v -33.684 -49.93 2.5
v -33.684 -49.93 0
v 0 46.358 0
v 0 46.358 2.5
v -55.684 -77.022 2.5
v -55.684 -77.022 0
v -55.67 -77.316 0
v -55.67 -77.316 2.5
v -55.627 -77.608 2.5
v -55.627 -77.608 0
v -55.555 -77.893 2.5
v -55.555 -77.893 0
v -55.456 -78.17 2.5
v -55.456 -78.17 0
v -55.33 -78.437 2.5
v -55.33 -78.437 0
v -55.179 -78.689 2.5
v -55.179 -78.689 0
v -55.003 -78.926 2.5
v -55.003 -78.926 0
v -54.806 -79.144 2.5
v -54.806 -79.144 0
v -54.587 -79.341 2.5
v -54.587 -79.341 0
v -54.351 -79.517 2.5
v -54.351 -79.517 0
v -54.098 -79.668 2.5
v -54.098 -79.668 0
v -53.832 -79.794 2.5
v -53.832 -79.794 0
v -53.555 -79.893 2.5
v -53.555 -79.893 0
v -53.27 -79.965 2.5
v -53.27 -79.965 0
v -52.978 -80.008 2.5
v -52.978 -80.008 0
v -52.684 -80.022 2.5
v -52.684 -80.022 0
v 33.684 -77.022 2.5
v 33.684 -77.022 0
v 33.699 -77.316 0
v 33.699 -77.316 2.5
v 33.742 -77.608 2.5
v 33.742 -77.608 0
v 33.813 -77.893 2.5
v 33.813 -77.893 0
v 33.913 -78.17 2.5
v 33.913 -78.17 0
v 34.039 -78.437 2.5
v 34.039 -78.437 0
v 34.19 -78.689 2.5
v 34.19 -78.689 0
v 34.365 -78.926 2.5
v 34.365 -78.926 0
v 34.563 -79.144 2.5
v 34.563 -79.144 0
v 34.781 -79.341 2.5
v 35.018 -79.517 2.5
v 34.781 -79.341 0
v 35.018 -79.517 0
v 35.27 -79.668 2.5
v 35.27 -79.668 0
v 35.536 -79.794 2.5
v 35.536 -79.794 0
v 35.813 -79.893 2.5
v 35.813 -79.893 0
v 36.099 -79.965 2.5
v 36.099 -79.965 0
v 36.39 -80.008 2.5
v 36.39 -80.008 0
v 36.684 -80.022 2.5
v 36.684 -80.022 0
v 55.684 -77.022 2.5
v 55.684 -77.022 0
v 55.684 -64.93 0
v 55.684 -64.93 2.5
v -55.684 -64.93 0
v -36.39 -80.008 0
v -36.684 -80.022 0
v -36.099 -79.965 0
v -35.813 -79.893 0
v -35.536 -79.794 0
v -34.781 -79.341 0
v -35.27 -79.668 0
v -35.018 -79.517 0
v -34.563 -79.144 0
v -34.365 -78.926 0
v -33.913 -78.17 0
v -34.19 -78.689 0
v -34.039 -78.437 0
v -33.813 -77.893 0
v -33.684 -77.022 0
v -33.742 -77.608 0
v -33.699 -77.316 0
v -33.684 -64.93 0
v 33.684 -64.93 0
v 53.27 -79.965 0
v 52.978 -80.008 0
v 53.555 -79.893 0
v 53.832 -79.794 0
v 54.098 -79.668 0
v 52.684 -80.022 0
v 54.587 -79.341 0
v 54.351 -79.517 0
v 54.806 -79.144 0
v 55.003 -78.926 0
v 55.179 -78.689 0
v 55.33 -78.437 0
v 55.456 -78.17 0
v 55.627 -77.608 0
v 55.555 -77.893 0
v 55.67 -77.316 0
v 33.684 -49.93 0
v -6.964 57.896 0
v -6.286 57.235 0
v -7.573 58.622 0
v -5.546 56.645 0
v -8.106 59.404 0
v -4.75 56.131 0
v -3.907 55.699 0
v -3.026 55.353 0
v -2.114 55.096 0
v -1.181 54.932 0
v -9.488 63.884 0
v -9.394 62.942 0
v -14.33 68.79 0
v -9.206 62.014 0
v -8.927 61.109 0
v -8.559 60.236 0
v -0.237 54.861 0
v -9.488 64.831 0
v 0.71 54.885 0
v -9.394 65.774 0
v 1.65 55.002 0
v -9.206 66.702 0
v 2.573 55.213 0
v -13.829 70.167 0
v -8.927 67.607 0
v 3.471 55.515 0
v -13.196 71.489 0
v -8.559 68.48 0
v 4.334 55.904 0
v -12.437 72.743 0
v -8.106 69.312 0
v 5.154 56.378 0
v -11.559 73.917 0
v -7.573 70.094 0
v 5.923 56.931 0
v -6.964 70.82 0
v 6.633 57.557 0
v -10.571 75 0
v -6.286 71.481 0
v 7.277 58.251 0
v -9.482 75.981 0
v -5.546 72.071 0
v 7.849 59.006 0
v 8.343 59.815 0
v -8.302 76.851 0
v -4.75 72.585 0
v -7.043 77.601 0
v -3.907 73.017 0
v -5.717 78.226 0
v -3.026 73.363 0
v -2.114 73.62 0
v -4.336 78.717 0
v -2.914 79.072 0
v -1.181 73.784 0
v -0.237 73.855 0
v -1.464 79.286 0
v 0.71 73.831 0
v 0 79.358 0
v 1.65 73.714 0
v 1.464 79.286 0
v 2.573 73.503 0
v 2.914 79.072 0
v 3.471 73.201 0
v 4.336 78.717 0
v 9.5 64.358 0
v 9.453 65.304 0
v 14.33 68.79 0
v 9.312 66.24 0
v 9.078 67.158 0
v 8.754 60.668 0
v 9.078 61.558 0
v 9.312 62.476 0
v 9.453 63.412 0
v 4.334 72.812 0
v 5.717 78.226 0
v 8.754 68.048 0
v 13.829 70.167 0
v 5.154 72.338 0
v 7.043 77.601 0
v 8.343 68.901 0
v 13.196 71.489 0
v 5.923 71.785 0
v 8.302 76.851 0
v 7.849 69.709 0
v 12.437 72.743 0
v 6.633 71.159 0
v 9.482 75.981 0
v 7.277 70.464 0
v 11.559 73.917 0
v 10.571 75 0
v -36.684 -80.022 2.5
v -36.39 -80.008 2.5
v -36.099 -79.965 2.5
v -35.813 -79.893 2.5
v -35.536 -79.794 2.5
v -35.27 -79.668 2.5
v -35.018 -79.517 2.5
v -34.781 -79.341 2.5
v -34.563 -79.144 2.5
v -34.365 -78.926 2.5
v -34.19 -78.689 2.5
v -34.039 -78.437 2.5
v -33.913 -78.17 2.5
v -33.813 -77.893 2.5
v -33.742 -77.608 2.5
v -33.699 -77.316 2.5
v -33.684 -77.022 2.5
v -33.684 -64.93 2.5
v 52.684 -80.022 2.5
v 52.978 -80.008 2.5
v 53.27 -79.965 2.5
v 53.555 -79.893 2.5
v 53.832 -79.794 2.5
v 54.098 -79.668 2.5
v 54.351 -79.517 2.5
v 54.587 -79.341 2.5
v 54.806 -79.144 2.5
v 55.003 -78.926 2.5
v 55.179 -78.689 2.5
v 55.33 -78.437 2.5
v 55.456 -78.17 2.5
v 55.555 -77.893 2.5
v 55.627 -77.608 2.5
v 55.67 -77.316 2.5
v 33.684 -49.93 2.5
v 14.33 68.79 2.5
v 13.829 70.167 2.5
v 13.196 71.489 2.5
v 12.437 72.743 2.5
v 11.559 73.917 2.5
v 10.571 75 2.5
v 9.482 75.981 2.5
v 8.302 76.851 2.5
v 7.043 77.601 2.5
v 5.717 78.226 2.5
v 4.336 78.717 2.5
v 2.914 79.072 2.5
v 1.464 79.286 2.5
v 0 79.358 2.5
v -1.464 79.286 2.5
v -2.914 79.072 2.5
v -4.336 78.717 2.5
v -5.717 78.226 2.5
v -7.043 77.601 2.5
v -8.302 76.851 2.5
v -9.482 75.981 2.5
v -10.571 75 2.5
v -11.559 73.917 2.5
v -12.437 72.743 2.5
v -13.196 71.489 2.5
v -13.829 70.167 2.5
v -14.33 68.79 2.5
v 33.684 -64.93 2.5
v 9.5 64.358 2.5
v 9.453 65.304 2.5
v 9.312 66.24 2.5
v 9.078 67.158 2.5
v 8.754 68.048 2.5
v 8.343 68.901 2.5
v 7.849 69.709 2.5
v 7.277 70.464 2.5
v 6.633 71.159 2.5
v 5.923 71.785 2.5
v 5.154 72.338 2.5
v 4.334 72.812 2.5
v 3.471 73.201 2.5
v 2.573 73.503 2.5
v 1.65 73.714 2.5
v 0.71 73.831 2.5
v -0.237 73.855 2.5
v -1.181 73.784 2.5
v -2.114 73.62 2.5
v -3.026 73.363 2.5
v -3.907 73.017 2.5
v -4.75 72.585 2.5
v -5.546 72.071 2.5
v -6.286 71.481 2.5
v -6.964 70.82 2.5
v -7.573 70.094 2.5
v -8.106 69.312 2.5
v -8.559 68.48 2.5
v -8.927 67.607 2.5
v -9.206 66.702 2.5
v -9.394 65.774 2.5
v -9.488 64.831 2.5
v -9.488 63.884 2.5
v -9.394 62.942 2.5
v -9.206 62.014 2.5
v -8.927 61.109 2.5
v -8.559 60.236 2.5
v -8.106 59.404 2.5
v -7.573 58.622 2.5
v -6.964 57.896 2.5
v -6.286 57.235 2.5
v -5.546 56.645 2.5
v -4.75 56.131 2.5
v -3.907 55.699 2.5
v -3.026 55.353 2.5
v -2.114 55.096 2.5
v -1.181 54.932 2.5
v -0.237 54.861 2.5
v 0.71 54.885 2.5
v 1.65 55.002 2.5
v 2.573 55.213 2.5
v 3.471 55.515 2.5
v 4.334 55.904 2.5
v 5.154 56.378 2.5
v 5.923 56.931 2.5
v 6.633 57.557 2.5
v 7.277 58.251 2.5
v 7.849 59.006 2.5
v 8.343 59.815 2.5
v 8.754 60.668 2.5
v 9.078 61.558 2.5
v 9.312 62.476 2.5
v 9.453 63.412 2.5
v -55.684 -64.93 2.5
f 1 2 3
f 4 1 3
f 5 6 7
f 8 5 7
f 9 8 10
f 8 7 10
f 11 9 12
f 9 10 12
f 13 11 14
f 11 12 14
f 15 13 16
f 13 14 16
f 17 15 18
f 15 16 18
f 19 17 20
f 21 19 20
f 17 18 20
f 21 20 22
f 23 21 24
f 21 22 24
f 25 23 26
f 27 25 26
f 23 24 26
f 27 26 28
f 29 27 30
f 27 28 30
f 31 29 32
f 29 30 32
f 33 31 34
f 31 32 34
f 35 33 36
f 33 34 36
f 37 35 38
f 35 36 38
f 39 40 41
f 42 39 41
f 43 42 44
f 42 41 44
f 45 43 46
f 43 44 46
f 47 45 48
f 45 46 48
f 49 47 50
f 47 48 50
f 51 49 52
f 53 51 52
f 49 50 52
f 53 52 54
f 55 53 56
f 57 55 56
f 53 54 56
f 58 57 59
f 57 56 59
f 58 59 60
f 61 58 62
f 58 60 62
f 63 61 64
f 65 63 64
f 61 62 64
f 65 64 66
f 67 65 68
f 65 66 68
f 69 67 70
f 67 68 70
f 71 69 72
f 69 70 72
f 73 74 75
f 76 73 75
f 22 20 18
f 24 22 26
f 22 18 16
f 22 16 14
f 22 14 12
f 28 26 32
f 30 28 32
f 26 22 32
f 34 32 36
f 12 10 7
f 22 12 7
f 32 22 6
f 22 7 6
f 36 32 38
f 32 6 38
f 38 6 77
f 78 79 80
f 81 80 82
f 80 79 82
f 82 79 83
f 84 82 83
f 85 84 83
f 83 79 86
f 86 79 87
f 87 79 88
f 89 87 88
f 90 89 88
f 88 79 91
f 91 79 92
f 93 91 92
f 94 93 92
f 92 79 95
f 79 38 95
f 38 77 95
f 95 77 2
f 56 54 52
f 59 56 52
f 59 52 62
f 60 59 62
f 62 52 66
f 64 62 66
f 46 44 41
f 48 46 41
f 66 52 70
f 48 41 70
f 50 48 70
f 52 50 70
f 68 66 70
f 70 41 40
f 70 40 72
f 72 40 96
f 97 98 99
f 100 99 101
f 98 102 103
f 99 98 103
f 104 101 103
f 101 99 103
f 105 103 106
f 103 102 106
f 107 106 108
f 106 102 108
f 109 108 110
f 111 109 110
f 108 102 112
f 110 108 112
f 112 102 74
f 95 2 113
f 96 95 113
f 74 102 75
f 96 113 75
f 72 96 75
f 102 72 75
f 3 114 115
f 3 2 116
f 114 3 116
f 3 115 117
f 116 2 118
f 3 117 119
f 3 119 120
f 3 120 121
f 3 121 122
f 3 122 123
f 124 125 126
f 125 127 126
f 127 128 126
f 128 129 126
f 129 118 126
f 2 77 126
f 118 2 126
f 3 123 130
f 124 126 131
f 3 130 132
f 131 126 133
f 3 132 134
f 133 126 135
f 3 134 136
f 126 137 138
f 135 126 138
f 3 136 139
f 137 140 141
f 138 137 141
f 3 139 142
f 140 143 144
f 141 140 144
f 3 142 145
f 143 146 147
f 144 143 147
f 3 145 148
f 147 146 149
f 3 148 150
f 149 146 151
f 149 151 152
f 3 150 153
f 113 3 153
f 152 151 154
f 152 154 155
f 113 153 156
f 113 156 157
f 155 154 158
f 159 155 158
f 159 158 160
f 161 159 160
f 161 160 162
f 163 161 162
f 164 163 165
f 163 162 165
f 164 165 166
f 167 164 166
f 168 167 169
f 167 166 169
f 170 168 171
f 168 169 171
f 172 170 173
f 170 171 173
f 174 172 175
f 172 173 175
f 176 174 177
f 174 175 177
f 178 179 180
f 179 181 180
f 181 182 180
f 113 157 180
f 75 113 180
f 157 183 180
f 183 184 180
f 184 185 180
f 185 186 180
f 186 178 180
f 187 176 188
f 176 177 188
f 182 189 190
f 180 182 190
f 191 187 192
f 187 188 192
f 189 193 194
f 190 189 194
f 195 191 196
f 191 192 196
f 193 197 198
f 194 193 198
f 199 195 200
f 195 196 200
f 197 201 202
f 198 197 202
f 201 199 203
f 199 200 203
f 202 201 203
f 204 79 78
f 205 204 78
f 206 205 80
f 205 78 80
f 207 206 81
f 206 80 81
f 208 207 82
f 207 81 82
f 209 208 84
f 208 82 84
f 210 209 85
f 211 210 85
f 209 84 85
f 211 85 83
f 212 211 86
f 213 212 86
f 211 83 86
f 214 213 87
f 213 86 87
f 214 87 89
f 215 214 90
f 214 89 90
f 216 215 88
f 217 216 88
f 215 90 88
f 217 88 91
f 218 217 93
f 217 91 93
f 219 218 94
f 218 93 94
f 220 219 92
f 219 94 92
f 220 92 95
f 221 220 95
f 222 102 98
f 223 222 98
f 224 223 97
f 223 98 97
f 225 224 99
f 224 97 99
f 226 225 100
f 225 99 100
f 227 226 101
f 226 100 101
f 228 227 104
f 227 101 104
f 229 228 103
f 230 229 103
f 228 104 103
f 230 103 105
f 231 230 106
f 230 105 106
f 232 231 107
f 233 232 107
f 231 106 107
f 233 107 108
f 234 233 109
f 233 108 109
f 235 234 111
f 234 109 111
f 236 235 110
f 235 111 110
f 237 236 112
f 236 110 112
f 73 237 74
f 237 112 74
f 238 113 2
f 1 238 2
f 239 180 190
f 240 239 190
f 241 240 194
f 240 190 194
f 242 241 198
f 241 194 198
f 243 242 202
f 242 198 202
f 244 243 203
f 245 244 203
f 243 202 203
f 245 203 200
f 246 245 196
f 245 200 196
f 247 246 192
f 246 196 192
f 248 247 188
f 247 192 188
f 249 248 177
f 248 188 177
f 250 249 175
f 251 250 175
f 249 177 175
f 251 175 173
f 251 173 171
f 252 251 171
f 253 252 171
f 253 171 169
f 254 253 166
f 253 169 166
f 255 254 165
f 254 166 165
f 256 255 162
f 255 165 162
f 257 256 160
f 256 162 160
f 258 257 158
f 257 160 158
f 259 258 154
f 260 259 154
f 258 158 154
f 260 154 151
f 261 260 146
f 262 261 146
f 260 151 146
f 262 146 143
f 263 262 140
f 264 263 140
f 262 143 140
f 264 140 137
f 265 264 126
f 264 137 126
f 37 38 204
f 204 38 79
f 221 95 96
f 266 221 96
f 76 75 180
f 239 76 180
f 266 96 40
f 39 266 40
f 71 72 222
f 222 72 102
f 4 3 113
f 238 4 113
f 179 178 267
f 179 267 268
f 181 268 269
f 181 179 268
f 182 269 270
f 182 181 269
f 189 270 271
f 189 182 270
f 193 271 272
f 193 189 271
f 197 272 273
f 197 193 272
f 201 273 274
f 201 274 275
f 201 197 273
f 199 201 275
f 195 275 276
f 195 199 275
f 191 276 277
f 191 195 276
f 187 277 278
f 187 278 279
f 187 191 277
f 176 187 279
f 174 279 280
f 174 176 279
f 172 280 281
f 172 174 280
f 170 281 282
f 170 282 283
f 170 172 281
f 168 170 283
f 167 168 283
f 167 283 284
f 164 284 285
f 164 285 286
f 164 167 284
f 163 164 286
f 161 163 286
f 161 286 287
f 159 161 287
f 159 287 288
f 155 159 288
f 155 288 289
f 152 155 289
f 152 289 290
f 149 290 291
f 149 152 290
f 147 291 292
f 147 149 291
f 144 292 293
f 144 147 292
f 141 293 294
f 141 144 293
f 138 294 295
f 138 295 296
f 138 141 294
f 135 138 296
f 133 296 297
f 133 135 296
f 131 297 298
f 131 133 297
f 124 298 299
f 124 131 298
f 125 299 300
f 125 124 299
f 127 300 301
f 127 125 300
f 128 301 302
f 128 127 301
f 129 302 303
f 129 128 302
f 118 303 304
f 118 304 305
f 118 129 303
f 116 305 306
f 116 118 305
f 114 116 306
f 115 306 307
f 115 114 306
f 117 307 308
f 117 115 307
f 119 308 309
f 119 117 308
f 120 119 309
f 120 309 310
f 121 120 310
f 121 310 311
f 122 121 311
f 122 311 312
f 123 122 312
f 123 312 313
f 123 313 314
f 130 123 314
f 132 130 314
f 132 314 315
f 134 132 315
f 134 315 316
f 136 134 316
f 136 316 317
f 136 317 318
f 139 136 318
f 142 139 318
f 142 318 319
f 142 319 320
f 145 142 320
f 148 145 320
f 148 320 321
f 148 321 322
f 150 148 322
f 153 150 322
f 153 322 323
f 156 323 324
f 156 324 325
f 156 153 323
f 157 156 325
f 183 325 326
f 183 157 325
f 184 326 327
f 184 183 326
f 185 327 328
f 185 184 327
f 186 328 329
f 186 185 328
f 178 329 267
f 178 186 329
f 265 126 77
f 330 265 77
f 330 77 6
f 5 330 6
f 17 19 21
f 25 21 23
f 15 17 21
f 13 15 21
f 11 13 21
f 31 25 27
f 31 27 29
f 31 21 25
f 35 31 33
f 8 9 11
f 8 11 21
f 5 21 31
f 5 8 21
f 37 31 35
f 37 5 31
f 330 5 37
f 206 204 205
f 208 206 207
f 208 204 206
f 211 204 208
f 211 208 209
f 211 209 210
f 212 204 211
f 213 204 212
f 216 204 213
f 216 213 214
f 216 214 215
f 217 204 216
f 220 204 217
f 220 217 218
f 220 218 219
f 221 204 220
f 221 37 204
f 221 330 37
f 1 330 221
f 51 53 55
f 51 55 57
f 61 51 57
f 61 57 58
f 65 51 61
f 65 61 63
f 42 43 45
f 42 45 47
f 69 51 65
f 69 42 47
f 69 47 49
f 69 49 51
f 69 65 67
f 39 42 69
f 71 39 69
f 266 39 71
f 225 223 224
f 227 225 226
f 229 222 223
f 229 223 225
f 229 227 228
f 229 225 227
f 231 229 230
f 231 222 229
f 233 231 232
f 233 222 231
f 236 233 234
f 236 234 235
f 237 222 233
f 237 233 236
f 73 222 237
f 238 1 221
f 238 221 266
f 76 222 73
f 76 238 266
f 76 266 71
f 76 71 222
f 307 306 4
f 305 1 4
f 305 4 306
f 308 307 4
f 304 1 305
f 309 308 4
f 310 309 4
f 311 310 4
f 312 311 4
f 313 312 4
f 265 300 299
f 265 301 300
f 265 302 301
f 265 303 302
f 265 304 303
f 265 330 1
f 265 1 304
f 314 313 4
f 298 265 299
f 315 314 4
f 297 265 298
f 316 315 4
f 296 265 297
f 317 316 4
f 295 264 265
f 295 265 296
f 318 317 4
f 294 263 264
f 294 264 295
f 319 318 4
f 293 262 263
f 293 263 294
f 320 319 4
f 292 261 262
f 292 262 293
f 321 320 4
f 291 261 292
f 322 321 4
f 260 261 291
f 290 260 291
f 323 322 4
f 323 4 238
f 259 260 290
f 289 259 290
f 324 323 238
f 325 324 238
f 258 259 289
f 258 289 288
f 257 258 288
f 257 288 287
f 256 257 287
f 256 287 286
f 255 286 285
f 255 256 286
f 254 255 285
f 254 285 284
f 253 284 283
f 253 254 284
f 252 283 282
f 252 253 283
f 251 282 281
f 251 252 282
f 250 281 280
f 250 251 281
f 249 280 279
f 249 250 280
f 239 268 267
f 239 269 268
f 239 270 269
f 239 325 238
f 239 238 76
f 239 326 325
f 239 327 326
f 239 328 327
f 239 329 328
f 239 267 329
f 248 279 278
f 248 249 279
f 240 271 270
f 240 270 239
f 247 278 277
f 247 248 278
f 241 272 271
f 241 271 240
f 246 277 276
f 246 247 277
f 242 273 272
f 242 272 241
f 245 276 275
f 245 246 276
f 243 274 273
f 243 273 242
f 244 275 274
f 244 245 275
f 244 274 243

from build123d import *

# Parameters (mm, degrees)
F0_R     = 9.5
F1_DEPTH = 2.5


with BuildPart() as f1:
    # F0 (on Top) → F1 (new body)
    with BuildSketch(Plane.XY):
        with BuildLine():
            ThreePointArc((-14.330367, 68.789729), (-2.241038, 49.526311), (15, 64.357958))
            ThreePointArc((15, 64.357958), (14.831647, 66.598995), (14.330367, 68.789729))
            ThreePointArc((14.330367, 68.789729), (0, 79.357958), (-14.330367, 68.789729))
        make_face()
        with Locations((0, 64.357958)):
            Circle(F0_R, mode=Mode.SUBTRACT)
        with BuildLine():
            ThreePointArc((14.330367, 68.789729), (14.831647, 66.598995), (15, 64.357958))
            ThreePointArc((15, 64.357958), (-2.241038, 49.526311), (-14.330367, 68.789729))
            Line((-14.330367, 68.789729), (-55.684302, -64.930417))
            Line((-55.684302, -64.930417), (-55.684302, -77.022406))
            ThreePointArc((-55.684302, -77.022406), (-54.805622, -79.143726), (-52.684302, -80.022406))
            Line((-52.684302, -80.022406), (-36.684302, -80.022406))
            ThreePointArc((-36.684302, -80.022406), (-34.562982, -79.143726), (-33.684302, -77.022406))
            Line((-33.684302, -77.022406), (-33.684302, -64.930417))
            Line((-33.684302, -64.930417), (33.684302, -64.930417))
            Line((33.684302, -64.930417), (33.684302, -77.022406))
            ThreePointArc((33.684302, -77.022406), (34.562982, -79.143726), (36.684302, -80.022406))
            Line((36.684302, -80.022406), (52.684302, -80.022406))
            ThreePointArc((52.684302, -80.022406), (54.805622, -79.143726), (55.684302, -77.022406))
            Line((55.684302, -77.022406), (55.684302, -64.930417))
            Line((55.684302, -64.930417), (14.330367, 68.789729))
        make_face()
        Polygon((33.684302, -49.930417), (0, -49.930417), (-33.684302, -49.930417), (0, 46.357958), align=None, mode=Mode.SUBTRACT)
    extrude(amount=F1_DEPTH)


solid = f1.part
